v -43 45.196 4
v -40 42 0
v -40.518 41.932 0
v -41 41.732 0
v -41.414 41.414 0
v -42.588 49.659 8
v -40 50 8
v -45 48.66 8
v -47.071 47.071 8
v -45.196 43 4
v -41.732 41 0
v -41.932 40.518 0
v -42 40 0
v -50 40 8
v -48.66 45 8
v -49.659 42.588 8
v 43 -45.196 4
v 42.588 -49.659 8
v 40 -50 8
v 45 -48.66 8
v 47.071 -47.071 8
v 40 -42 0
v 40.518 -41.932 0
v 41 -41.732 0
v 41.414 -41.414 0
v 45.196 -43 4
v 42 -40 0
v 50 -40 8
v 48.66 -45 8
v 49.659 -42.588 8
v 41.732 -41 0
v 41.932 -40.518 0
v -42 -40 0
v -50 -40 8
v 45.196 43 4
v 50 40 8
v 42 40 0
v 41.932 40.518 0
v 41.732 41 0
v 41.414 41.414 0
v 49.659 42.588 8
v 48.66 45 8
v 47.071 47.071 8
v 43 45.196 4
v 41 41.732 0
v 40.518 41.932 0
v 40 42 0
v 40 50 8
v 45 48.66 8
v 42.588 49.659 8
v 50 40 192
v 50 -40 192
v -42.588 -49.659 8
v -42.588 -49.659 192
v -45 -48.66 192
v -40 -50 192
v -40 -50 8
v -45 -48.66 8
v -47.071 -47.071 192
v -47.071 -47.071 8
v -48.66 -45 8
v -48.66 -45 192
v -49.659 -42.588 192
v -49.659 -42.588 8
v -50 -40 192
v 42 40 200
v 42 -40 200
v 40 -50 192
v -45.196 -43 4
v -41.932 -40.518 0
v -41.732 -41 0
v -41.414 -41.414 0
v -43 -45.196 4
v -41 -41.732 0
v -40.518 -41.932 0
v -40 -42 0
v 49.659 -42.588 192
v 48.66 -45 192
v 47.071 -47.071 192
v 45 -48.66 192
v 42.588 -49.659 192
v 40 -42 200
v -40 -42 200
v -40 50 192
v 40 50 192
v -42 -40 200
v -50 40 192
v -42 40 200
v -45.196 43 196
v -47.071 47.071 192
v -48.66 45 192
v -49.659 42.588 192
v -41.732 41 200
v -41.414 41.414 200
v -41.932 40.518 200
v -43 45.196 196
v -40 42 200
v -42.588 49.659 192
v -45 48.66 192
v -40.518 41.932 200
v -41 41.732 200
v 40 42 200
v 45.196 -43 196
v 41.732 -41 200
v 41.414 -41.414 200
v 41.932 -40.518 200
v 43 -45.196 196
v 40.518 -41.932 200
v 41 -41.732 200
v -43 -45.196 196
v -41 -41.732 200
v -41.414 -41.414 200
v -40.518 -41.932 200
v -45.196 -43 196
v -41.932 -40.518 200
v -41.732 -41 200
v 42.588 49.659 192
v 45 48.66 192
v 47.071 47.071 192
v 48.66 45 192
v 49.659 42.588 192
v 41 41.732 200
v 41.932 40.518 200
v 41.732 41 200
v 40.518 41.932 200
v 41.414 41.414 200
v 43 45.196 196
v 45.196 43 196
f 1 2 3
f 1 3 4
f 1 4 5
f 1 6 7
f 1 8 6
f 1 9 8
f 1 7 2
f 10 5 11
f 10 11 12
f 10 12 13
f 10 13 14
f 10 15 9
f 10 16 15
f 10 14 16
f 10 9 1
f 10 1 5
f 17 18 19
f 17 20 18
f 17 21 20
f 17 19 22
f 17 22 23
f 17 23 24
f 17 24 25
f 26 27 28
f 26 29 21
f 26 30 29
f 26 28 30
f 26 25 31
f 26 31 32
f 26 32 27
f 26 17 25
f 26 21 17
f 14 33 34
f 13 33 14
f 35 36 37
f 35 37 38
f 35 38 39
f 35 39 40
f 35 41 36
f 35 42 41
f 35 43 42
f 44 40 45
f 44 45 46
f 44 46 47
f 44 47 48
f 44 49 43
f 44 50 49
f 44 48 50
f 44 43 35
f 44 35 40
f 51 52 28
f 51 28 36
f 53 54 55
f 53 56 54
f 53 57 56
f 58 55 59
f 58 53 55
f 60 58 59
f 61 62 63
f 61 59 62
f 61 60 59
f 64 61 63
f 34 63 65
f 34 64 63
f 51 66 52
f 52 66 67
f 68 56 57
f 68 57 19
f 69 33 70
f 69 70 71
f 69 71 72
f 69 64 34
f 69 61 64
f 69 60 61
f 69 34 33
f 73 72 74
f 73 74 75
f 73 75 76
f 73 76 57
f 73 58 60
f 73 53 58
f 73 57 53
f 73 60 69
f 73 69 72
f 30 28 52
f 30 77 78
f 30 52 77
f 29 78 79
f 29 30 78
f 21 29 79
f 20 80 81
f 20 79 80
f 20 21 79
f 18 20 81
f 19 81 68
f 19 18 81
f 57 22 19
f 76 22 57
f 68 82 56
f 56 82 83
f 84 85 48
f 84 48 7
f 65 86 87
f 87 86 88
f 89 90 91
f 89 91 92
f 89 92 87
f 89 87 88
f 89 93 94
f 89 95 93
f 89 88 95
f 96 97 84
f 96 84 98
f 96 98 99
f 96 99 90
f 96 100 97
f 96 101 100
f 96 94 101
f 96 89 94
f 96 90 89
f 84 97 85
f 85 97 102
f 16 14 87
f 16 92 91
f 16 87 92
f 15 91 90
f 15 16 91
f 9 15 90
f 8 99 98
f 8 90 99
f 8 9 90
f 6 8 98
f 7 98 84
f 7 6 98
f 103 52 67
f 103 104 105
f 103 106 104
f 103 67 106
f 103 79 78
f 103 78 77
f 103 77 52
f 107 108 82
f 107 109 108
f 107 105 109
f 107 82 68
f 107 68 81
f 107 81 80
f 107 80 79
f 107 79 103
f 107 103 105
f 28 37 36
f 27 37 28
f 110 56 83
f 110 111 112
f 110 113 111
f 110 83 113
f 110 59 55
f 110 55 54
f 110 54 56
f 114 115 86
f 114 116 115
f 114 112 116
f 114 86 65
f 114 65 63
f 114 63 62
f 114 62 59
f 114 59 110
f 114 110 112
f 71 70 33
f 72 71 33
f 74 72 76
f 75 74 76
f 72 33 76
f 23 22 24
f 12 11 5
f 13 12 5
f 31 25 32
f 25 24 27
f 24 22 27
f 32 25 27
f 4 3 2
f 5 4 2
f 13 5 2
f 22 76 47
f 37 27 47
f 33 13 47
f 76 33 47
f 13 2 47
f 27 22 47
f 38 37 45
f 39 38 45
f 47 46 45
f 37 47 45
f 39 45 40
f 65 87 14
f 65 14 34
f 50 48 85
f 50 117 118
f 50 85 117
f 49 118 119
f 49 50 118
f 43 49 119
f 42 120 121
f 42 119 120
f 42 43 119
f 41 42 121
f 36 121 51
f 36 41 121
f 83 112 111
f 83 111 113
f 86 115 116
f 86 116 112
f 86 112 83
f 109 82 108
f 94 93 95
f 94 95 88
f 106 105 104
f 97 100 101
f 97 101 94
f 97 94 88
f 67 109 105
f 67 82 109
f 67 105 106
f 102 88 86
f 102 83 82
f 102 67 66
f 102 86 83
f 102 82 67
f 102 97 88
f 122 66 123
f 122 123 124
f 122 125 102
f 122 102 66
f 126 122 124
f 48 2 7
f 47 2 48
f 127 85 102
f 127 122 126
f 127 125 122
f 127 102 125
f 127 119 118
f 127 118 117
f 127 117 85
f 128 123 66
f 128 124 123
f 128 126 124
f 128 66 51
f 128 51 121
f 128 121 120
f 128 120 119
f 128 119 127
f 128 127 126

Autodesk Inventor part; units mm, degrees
ref_plane "YZ Plane" through (0, 0, 0) normal (1, 0, 0) x (0, 1, 0)
ref_plane "XZ Plane" through (0, 0, 0) normal (0, 1, 0) x (-1, 0, 0)
ref_plane "XY Plane" through (0, 0, 0) normal (0, 0, 1) x (1, 0, 0)
sketch "Skizze1" plane through (0, 0, 0) normal (0, 0, 1) x (1, 0, 0)
  line L0 (-40, -50) -> (40, -50)
  line L1 (50, -40) -> (50, 40)
  line L2 (40, 50) -> (-40, 50)
  line L3 (-50, 40) -> (-50, -40)
  line L4 (-50, -50) -> (50, 50) construction
  line L5 (50, -50) -> (-50, 50) construction
  arc A0 (-40, 50) -> (-50, 40) centre (-40, 40) ccw
  arc A1 (50, 40) -> (40, 50) centre (40, 40) ccw
  arc A2 (40, -50) -> (50, -40) centre (40, -40) ccw
  arc A3 (-50, -40) -> (-40, -50) centre (-40, -40) ccw
  point P0 (0, 0)
  dimension "d0" = 100
  dimension "d1" = 100
  dimension "d2" = 10
extrude "Extrusion1" add sketch "Skizze1" along normal blind 200
chamfer "Fase1" distance 8 angle 45 16 edges at (50, 0, 200) (47.0711, 47.0711, 200) (0, 50, 200) (-47.0711, 47.0711, 200) (-50, 0, 200) (-47.0711, -47.0711, 200) (0, -50, 200) (47.0711, -47.0711, 200) (50, 0, 0) (47.0711, 47.0711, 0) (0, 50, 0) (-47.0711, 47.0711, 0) (-50, 0, 0) (-47.0711, -47.0711, 0) (0, -50, 0) (47.0711, -47.0711, 0)
properties part number "Motor"
